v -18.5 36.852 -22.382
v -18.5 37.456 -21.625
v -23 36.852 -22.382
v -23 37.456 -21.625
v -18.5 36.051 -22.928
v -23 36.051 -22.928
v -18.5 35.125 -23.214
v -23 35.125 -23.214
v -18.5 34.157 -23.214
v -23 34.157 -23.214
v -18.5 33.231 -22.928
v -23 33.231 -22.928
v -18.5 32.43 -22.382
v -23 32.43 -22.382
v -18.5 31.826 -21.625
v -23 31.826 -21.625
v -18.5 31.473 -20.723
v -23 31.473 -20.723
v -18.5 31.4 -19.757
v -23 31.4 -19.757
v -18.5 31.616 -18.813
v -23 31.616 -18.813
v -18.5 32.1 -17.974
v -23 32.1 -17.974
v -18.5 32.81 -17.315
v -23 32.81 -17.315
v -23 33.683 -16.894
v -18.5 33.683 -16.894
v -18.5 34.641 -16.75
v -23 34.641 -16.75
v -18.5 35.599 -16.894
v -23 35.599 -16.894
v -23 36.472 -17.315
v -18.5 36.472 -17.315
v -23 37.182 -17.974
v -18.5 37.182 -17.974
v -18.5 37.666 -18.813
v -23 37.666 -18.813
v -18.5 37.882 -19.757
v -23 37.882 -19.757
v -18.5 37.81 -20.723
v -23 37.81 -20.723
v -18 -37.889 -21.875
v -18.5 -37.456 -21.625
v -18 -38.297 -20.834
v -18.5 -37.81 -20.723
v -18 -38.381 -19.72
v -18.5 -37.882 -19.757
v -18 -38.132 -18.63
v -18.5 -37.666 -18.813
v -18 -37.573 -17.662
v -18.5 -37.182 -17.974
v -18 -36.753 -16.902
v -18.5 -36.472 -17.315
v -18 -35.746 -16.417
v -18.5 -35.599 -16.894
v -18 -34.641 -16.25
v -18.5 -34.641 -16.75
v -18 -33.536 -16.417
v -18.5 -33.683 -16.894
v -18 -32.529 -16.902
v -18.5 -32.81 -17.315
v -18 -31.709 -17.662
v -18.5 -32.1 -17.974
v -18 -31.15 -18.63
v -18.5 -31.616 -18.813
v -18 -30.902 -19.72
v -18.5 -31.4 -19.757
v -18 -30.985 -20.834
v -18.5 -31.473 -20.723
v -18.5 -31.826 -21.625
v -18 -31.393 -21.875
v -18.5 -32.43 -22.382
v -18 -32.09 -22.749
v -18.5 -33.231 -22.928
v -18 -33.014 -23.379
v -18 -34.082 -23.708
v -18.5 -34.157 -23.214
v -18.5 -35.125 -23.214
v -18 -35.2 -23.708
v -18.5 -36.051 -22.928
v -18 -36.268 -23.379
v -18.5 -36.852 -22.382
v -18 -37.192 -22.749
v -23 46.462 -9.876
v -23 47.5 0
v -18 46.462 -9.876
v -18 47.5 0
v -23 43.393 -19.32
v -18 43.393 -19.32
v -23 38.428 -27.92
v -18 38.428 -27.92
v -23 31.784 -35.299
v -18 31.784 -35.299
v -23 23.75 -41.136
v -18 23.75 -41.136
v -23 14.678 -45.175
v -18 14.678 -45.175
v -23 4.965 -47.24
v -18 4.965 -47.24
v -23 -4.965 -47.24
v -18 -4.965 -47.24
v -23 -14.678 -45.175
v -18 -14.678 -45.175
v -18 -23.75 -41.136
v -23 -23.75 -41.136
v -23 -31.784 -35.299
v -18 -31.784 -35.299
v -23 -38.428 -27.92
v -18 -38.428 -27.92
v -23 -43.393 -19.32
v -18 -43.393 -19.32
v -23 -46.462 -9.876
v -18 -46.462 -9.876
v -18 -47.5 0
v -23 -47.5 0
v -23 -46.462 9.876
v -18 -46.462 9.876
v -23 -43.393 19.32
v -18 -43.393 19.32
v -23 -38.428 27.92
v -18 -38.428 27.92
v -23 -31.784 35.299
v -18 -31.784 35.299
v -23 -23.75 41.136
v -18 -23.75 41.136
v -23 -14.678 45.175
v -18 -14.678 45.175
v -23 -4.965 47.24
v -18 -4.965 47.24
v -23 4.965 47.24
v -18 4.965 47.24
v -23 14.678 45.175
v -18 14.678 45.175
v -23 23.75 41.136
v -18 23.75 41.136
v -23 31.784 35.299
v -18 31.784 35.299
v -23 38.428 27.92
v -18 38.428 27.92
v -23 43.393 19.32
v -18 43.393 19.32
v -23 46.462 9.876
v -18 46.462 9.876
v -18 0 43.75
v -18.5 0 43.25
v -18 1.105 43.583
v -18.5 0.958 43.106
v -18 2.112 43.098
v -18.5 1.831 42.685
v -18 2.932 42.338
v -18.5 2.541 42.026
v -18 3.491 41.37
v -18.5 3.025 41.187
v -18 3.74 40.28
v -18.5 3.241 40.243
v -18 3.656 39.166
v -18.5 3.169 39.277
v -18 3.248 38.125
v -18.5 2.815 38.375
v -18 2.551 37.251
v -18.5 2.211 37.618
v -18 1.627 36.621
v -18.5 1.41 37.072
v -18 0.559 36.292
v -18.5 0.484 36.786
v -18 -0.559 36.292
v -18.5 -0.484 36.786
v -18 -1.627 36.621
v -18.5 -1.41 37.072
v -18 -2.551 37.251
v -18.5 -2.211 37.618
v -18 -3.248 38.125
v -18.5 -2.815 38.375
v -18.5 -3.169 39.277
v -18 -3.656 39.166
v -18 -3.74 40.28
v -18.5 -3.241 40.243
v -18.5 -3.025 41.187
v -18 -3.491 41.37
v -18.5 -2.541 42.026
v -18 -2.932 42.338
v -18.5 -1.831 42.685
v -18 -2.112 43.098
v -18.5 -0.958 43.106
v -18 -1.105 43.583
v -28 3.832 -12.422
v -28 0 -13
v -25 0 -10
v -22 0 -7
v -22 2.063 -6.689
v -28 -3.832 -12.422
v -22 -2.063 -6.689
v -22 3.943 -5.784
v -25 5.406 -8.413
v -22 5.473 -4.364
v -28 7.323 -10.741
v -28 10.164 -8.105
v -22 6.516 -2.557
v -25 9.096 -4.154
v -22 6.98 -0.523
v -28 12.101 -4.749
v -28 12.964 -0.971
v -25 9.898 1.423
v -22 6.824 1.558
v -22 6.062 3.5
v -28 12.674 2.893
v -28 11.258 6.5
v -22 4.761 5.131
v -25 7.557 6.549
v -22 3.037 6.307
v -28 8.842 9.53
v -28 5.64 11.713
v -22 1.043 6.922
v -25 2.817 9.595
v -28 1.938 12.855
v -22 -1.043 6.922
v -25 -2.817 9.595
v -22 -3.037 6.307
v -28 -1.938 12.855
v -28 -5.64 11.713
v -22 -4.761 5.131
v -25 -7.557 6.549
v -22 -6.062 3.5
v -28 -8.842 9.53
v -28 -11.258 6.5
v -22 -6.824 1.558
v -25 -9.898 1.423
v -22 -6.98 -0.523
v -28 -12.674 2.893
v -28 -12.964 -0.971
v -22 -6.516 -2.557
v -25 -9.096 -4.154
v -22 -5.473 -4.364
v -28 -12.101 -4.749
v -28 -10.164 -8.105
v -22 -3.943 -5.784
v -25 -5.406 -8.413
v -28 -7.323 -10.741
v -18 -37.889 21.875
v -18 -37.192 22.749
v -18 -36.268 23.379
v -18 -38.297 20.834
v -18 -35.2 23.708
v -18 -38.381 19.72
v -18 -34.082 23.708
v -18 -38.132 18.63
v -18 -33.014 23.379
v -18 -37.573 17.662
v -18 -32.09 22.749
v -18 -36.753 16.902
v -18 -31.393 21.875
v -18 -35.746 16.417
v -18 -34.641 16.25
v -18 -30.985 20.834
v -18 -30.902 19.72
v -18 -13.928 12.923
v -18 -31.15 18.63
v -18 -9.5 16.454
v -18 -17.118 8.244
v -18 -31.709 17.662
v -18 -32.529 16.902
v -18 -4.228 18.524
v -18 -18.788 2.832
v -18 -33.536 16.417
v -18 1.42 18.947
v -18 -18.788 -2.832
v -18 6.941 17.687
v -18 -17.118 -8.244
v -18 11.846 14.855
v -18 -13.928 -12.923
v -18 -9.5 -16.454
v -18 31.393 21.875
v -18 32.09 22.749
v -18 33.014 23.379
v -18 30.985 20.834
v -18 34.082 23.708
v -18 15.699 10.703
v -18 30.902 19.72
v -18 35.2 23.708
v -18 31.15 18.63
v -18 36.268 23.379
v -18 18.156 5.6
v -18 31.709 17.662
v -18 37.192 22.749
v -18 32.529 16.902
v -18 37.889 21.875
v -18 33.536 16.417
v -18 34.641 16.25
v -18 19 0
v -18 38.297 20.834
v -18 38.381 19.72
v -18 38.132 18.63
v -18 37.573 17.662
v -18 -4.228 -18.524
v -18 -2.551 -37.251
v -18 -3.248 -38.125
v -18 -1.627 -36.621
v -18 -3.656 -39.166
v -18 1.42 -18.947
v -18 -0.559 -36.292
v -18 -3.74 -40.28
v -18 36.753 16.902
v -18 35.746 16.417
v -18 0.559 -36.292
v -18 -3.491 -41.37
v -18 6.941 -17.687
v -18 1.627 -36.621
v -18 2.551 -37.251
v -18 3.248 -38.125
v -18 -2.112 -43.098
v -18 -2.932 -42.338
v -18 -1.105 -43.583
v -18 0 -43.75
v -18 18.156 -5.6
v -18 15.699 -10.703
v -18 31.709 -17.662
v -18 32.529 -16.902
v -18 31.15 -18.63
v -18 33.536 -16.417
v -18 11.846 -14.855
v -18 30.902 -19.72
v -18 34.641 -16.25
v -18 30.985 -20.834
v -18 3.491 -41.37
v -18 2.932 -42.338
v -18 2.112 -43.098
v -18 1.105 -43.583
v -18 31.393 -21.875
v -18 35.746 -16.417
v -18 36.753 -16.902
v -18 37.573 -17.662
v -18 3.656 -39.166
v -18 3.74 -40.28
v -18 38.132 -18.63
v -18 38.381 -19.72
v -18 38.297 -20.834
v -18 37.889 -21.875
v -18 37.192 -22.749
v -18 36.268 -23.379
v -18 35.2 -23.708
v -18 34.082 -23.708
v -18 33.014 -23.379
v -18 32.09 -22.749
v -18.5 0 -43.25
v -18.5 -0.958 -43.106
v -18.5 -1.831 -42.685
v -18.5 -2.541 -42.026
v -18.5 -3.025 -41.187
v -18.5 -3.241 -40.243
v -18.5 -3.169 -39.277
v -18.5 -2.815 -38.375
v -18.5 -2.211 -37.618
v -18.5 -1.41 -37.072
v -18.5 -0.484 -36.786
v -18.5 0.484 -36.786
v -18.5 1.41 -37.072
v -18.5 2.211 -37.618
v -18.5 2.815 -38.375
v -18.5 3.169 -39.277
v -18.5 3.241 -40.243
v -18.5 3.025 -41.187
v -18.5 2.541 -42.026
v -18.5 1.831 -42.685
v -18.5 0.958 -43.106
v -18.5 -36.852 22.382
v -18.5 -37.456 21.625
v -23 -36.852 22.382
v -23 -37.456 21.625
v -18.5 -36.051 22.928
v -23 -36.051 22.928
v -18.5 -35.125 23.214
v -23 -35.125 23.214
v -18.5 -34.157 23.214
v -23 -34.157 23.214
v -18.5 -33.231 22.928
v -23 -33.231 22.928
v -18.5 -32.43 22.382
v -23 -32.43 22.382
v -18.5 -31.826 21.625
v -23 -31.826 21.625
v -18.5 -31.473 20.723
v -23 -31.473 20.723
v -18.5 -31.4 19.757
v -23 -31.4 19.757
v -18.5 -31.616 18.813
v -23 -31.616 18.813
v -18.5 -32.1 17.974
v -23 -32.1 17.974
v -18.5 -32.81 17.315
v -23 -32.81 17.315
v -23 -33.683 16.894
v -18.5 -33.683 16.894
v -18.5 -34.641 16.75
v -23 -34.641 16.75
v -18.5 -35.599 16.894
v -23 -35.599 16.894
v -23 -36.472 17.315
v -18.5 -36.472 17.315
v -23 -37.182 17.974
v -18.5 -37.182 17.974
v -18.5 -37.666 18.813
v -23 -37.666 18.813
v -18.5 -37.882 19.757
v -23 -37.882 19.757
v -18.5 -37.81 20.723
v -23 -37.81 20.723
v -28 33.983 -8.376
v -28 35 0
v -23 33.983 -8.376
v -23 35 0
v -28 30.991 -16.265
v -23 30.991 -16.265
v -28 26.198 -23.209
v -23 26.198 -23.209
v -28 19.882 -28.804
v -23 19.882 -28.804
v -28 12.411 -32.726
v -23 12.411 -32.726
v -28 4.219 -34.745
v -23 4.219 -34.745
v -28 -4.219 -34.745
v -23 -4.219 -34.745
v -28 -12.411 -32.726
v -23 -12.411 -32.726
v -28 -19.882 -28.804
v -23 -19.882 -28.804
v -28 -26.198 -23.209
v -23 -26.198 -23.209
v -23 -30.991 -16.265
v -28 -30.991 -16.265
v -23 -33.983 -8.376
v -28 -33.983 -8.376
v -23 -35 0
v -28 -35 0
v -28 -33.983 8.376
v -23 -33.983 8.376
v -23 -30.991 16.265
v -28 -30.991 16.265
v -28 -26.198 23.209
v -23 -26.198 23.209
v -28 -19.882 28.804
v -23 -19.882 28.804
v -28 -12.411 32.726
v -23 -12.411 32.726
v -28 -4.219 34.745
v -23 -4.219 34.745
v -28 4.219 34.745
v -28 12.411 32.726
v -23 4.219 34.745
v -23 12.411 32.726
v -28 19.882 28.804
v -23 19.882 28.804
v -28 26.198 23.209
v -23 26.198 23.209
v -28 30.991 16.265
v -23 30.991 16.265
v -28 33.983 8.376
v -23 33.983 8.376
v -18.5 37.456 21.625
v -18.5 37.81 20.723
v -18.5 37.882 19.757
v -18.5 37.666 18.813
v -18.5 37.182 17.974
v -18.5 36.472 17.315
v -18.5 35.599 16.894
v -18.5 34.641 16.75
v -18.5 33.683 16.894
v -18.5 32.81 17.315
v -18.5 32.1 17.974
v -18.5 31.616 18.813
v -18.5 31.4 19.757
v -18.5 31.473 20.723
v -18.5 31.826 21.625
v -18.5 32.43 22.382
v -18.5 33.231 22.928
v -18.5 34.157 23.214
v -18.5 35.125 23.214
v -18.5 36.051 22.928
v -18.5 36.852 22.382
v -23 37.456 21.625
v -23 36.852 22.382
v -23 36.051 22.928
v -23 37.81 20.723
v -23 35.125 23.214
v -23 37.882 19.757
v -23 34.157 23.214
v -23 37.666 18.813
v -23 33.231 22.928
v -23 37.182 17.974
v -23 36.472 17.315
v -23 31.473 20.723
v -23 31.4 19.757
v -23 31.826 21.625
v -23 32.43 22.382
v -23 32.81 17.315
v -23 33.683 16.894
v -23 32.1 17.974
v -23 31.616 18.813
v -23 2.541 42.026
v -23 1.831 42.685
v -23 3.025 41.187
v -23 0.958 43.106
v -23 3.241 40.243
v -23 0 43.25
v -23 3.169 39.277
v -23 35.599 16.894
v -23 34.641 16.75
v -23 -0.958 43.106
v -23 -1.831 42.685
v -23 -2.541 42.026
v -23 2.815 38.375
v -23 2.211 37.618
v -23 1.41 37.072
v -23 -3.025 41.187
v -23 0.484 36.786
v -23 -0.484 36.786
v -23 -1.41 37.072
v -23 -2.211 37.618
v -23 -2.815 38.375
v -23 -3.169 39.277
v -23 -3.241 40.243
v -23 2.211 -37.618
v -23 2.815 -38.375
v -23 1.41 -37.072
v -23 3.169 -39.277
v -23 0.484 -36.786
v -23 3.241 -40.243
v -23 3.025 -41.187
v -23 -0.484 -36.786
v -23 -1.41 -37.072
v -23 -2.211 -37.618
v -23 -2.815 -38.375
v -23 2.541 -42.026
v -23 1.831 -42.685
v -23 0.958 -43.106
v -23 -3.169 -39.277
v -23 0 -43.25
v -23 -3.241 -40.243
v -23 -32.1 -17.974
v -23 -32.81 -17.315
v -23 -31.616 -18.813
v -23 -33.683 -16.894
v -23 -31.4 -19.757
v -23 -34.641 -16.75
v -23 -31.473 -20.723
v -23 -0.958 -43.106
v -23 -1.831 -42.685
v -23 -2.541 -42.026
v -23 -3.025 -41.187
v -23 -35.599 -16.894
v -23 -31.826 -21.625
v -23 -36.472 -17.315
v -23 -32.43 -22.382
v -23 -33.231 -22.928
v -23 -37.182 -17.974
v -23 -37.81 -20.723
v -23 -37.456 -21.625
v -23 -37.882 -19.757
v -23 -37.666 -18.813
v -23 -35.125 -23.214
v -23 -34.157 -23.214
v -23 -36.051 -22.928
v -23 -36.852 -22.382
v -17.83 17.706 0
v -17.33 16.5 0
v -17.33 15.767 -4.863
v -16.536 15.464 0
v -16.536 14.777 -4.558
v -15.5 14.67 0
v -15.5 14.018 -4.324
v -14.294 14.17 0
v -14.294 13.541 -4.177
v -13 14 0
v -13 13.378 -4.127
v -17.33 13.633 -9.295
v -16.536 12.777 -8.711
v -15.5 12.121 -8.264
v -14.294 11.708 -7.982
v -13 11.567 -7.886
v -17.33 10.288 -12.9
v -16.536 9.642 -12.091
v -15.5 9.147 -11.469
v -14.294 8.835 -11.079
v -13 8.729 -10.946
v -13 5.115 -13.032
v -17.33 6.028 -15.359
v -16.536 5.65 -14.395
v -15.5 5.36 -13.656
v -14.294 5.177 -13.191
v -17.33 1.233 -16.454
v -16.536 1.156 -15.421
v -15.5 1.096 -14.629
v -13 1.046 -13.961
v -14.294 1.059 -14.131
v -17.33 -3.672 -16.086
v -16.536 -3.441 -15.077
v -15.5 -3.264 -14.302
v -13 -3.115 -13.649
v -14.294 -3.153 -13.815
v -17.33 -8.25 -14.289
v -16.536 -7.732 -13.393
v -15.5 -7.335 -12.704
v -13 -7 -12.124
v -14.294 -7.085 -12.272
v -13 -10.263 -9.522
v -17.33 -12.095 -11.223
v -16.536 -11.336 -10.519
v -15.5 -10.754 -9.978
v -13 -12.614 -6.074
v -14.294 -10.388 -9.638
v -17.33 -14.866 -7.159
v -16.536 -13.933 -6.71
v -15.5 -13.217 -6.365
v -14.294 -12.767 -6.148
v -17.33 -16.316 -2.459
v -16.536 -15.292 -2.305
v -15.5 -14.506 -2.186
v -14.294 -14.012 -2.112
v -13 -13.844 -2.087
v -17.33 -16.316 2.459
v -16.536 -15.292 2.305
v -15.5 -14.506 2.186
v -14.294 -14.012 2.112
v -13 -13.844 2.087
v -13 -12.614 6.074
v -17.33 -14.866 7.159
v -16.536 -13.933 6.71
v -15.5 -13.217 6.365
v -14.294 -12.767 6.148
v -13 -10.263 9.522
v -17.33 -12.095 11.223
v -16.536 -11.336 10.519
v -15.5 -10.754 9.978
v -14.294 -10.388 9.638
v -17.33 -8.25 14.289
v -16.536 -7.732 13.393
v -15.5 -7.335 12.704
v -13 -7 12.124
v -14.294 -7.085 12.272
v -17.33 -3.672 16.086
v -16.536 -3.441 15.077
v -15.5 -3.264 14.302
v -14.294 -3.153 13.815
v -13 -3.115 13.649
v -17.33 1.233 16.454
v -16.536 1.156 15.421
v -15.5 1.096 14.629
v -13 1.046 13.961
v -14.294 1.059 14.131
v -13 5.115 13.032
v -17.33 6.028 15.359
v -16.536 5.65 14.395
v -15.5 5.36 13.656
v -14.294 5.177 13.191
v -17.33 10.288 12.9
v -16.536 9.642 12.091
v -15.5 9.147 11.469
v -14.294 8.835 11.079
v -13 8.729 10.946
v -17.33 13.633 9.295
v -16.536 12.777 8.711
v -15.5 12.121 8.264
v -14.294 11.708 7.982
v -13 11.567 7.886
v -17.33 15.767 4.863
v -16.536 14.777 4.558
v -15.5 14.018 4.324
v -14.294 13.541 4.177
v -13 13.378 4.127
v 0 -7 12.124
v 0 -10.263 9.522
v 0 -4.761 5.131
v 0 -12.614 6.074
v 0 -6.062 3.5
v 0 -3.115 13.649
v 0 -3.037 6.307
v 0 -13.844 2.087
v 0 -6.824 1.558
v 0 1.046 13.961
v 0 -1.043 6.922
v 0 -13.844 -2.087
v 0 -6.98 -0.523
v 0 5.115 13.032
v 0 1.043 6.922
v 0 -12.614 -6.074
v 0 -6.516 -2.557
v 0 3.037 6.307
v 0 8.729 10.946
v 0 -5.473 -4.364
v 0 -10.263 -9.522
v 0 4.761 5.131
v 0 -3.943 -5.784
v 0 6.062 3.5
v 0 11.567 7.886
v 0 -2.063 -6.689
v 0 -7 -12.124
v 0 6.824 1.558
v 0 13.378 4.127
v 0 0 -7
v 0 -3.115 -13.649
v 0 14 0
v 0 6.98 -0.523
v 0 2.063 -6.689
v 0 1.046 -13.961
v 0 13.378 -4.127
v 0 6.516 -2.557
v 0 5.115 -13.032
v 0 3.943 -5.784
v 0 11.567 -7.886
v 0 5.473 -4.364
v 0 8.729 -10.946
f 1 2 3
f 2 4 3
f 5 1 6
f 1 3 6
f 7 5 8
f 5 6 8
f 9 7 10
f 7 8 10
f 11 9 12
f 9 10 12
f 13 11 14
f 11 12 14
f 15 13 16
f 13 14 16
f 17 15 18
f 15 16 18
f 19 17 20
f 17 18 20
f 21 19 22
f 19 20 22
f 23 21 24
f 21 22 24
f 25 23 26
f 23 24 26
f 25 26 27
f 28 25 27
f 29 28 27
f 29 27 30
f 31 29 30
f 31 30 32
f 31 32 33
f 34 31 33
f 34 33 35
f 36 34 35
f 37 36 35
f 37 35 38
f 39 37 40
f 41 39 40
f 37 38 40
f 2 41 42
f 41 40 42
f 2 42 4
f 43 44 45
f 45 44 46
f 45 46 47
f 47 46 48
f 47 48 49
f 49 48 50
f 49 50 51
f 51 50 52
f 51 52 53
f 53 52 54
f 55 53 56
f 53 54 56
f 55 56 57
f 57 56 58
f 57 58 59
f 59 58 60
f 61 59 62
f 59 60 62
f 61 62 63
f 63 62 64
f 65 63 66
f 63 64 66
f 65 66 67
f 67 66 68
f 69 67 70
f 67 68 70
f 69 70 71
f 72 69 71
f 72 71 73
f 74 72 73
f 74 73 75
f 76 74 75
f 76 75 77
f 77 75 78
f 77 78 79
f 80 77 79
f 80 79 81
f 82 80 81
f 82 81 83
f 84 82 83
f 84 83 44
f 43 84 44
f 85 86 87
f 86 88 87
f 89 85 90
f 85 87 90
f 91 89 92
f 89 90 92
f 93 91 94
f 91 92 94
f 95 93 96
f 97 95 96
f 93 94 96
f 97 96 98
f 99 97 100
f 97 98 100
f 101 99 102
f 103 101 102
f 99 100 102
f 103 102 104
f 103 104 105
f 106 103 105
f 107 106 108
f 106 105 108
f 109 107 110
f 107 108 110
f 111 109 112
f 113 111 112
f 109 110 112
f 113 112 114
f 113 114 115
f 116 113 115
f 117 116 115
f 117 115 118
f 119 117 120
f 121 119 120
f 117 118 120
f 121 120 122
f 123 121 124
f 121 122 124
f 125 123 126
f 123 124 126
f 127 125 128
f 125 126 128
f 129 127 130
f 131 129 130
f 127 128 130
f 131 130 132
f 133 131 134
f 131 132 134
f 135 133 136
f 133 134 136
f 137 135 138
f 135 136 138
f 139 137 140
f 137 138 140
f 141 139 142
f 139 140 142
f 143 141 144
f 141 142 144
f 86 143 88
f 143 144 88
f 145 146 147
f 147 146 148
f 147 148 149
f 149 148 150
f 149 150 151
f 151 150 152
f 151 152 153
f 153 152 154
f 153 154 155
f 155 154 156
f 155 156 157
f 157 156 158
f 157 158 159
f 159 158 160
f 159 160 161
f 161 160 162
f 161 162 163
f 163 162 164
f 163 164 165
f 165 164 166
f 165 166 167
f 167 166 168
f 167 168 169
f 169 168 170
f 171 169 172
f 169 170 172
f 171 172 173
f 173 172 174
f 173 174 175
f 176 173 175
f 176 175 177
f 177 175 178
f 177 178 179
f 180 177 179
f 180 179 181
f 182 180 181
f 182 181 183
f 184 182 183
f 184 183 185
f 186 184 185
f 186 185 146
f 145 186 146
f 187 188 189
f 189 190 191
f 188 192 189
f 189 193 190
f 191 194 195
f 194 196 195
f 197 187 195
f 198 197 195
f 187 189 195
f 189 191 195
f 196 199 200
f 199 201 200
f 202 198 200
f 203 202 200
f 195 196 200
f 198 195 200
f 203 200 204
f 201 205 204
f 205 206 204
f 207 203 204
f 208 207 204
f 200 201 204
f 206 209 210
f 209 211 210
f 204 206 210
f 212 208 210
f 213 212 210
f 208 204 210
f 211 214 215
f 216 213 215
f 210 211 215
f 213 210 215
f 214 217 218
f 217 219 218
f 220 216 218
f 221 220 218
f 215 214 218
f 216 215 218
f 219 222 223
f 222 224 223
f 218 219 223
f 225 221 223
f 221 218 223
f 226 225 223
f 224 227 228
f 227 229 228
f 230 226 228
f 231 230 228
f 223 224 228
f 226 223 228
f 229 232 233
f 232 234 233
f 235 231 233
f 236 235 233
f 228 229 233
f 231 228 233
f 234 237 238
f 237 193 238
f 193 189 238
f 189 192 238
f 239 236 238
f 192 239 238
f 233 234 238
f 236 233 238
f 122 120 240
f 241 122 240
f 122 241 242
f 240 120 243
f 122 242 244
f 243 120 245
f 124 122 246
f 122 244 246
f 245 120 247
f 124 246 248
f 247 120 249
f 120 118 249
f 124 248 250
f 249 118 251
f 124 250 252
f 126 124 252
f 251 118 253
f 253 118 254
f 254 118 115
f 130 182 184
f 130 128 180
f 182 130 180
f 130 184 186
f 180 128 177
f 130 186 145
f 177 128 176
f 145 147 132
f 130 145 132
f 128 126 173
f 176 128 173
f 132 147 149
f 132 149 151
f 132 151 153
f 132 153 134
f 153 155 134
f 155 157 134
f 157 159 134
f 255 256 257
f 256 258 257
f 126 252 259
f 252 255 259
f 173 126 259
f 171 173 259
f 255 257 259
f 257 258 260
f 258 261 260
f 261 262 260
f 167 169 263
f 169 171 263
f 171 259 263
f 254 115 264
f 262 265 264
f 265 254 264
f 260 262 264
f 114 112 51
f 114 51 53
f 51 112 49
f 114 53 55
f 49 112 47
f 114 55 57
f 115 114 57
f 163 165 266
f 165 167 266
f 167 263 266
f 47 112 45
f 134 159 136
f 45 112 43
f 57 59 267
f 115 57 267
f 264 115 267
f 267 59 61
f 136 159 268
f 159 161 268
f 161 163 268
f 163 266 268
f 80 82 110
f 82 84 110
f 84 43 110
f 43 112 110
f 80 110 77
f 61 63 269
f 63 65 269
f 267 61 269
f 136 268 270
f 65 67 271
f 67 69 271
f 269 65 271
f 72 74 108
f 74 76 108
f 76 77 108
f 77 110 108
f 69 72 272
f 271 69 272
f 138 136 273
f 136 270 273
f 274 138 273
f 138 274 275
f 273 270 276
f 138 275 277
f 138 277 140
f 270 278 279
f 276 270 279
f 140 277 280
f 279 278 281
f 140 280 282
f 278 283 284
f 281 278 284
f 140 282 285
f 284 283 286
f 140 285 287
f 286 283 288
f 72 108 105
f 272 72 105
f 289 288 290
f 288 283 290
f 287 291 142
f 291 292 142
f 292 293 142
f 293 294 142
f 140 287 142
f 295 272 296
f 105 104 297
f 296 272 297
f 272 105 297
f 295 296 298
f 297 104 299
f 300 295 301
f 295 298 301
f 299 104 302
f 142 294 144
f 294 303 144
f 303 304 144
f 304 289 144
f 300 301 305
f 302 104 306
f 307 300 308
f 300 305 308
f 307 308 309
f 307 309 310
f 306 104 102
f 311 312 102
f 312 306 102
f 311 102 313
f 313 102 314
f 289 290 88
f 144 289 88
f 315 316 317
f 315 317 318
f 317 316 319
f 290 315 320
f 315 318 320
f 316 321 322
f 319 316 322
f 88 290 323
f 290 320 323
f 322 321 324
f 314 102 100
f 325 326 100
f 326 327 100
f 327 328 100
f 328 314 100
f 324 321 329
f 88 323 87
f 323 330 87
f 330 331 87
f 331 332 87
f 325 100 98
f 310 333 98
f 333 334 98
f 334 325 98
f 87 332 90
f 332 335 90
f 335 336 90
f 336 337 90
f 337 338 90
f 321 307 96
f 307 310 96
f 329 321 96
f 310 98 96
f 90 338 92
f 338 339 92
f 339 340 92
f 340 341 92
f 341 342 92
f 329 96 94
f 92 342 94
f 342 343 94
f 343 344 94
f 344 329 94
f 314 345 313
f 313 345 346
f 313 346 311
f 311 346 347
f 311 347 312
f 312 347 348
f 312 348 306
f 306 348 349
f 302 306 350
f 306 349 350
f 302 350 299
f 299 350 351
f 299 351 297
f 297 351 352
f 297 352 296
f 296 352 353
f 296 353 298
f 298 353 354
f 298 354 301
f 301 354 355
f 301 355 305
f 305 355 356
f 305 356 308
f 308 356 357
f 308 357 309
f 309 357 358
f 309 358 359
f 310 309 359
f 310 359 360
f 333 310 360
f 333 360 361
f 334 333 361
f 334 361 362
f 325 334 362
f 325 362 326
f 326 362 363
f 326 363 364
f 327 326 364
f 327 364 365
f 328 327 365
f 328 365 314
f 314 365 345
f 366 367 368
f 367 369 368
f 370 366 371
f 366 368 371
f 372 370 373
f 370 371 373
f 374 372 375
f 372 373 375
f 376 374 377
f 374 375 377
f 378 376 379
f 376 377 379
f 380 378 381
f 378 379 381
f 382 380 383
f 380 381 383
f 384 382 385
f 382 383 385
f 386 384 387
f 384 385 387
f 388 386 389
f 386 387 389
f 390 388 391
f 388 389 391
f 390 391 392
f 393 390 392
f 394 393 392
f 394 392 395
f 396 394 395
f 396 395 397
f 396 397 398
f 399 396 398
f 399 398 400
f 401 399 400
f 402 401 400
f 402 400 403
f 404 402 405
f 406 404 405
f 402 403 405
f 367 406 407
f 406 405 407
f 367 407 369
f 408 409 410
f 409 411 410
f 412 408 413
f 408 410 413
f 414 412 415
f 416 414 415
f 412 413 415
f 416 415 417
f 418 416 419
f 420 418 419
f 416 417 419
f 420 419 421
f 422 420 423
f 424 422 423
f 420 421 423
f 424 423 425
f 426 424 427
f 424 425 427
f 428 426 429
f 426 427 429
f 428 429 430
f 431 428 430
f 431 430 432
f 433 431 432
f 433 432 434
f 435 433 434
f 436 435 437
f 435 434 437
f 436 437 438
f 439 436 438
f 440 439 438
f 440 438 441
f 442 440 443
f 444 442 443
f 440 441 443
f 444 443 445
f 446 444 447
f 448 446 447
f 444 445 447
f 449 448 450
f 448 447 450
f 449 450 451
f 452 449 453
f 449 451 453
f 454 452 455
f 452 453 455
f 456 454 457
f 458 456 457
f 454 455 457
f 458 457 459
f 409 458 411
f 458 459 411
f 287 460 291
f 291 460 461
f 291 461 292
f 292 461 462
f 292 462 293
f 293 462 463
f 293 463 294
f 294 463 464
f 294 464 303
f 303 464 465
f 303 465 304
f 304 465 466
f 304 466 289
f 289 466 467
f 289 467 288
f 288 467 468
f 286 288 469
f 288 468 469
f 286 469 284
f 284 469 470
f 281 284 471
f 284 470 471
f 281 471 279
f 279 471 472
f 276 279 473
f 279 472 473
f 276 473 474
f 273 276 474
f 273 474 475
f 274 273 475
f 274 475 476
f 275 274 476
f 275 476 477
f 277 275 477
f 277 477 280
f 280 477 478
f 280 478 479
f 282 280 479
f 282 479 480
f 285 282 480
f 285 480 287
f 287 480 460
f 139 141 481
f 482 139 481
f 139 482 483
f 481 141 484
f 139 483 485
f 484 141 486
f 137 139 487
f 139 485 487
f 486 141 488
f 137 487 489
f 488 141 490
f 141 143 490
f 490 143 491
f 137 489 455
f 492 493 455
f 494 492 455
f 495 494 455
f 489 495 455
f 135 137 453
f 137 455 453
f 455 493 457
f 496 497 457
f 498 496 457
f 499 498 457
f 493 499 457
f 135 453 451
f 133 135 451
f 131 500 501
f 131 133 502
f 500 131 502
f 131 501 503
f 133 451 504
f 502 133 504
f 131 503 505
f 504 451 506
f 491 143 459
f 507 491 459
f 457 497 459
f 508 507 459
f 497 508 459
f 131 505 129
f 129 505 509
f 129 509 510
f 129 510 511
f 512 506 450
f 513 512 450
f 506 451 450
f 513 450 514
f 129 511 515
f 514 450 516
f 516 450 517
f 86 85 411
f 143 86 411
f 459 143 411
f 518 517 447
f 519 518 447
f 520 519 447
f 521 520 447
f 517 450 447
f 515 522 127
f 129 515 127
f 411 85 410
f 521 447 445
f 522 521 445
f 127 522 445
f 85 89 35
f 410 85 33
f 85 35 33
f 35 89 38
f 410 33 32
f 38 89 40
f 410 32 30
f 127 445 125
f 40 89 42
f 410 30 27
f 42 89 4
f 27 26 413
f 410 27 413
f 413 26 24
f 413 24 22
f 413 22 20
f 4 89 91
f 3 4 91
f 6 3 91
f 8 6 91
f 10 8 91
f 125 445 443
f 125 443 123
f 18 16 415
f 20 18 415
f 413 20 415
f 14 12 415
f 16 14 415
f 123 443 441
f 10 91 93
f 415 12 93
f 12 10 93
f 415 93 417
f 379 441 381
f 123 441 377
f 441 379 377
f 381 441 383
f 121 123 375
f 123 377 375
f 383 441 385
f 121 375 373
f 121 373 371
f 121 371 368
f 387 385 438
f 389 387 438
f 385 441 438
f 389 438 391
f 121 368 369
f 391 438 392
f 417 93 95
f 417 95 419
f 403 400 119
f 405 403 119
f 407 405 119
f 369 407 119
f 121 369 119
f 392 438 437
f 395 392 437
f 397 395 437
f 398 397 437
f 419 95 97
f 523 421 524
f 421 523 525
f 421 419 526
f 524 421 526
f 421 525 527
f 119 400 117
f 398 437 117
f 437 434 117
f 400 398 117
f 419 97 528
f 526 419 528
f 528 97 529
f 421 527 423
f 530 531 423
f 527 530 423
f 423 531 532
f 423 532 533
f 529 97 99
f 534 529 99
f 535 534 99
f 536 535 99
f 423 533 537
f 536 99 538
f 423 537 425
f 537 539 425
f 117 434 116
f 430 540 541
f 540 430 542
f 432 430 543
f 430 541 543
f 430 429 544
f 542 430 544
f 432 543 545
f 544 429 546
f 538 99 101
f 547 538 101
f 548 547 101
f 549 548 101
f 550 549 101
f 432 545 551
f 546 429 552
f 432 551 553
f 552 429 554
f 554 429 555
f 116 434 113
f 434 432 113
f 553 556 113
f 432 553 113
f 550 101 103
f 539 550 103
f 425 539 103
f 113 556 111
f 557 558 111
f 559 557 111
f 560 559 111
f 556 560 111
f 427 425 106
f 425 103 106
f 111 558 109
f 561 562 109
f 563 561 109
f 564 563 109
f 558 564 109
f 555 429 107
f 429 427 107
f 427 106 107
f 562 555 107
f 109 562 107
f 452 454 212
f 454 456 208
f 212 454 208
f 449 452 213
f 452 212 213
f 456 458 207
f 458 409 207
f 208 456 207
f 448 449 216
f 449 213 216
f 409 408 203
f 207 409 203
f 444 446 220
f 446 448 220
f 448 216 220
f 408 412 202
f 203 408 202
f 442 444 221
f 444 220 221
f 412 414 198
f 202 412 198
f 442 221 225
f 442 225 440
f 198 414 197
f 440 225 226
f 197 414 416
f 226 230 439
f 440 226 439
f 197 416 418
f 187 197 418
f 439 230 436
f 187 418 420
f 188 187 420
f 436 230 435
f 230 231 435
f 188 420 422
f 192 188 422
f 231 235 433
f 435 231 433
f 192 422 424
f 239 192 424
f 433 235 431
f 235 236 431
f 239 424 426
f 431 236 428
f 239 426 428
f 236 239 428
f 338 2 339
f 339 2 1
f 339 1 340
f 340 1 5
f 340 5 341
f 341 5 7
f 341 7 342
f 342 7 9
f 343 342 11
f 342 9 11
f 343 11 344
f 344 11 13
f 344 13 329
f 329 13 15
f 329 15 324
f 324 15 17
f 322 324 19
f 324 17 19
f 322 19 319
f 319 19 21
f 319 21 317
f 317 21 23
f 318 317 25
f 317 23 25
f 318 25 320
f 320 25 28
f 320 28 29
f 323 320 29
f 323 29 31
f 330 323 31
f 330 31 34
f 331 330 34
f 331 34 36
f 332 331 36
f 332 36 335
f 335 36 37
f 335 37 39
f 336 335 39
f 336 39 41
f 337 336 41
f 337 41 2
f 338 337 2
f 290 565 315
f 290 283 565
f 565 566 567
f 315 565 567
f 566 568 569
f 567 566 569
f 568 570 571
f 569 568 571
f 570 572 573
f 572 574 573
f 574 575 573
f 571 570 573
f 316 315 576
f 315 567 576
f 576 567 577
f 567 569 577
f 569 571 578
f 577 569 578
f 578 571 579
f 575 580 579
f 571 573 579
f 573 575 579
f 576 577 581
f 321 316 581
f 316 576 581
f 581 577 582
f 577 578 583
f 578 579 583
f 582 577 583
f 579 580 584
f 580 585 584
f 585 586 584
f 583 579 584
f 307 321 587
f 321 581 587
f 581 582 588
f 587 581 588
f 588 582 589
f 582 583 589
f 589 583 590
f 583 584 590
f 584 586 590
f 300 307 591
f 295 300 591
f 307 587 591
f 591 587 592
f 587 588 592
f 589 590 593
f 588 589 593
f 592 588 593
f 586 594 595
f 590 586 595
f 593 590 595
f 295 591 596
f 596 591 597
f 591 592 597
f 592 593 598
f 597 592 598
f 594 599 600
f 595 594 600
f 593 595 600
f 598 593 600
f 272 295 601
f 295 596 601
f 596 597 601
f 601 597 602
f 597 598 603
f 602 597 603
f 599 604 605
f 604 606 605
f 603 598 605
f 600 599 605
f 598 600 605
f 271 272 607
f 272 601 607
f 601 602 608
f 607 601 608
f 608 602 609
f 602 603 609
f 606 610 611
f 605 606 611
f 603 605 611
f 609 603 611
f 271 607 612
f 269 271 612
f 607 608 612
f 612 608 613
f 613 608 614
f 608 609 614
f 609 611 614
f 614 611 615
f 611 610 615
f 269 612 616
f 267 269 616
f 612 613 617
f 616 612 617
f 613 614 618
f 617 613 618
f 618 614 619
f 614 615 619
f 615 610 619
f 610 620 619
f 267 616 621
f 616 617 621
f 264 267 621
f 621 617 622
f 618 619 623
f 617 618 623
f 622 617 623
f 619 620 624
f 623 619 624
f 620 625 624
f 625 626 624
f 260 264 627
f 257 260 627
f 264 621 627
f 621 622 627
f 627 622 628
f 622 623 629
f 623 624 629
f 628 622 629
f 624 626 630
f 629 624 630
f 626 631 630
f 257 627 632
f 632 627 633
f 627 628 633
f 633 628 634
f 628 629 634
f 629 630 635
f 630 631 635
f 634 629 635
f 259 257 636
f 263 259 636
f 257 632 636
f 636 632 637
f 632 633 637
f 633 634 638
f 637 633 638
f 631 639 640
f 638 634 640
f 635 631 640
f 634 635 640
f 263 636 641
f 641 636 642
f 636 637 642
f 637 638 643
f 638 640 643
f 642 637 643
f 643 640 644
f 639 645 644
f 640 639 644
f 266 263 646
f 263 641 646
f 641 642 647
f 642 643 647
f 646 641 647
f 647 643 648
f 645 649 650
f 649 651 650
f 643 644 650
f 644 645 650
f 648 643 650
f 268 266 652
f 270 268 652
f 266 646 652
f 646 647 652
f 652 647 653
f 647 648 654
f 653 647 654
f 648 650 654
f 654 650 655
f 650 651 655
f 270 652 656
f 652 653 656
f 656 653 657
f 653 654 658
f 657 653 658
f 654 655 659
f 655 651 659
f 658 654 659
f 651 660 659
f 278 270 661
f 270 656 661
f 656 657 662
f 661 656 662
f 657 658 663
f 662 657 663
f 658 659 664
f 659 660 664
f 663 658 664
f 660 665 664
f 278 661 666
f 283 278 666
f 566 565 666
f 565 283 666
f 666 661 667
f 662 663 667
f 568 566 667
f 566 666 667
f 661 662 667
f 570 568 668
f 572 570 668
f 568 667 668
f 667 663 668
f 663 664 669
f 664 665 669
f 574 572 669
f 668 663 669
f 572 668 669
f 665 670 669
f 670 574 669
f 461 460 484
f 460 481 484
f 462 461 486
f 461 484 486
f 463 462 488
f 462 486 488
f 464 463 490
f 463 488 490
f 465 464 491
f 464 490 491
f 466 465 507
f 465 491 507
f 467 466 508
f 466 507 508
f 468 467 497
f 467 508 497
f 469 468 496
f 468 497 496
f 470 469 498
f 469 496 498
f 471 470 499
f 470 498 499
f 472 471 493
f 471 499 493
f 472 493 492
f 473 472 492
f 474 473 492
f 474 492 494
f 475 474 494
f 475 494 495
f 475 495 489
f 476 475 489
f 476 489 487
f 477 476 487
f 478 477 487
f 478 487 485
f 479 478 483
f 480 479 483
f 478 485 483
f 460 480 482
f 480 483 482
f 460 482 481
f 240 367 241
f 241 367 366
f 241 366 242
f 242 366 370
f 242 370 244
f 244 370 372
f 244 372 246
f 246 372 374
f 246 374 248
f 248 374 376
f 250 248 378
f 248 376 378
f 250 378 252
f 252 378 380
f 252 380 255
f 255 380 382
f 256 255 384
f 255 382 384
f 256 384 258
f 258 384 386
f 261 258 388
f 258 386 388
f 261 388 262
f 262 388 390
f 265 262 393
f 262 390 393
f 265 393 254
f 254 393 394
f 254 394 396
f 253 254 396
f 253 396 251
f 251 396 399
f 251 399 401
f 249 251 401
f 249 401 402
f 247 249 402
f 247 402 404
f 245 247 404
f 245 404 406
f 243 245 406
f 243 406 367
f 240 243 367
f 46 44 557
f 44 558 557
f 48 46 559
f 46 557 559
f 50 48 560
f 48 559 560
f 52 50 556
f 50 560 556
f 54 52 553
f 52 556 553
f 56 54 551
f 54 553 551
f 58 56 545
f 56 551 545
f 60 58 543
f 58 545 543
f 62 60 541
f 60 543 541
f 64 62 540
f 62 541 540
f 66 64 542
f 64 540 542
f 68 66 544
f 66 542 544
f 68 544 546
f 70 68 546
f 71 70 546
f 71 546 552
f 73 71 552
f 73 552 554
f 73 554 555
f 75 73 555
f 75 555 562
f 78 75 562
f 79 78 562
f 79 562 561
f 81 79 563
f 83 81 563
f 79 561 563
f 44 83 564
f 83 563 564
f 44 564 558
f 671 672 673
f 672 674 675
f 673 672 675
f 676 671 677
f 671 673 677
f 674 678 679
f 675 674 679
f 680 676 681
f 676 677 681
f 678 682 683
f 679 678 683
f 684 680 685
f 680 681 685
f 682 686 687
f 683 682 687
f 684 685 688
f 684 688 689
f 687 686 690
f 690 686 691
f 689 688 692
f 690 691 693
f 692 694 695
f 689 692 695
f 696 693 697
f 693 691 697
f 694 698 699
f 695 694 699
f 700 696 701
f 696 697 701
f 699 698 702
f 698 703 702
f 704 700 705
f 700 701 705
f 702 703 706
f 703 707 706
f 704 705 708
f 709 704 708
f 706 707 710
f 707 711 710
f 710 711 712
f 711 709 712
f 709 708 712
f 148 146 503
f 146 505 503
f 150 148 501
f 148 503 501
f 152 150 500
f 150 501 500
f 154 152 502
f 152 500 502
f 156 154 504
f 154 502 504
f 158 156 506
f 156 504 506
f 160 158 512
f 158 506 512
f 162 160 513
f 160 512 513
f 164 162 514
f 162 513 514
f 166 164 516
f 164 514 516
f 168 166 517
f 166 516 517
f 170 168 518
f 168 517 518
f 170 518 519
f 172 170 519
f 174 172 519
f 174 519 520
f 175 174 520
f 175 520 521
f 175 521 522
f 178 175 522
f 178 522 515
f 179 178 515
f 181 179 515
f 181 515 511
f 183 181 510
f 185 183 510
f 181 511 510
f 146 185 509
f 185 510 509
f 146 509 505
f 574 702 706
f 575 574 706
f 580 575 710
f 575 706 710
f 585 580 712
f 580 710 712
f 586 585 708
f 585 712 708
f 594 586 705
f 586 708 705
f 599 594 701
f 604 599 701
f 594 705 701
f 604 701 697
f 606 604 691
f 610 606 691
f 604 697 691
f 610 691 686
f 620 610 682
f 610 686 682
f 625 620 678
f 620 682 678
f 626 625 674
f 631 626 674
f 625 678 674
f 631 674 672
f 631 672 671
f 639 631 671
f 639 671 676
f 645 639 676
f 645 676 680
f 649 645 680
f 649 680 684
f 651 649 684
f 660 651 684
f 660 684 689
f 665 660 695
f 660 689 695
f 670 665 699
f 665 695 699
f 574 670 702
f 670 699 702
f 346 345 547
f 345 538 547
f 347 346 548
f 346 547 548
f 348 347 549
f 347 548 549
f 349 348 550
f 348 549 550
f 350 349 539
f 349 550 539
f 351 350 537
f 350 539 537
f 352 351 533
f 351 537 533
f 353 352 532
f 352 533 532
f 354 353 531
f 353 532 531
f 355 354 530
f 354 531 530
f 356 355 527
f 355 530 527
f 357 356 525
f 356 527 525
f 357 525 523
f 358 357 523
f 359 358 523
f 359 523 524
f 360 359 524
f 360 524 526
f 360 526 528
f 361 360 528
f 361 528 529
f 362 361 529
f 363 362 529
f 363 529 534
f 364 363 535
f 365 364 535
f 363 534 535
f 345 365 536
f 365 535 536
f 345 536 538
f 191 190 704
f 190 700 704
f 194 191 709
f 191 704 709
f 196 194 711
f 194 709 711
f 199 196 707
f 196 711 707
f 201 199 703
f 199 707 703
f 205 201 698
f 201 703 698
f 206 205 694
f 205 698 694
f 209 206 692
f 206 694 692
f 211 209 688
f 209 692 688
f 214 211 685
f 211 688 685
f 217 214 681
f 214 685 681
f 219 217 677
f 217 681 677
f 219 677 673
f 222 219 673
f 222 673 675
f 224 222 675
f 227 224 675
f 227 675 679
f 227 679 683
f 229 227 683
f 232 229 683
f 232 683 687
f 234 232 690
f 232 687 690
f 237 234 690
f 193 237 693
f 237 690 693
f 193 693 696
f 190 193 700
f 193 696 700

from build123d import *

# Parameters (mm, degrees)
FILLET1_R                                            = 5
CSK_FOR_M12_HEX_SOCKET_COUNTERSUNK_CAP_S_D           = 14
CSK_FOR_M12_HEX_SOCKET_COUNTERSUNK_CAP_S_CSINK_D     = 26
CSK_FOR_M12_HEX_SOCKET_COUNTERSUNK_CAP_S_CSINK_ANGLE = 90
CSK_FOR_M6_HEX_SOCKET_COUNTERSUNK_CAP_SC_D           = 6.5
CSK_FOR_M6_HEX_SOCKET_COUNTERSUNK_CAP_SC_CSINK_D     = 7.5
CSK_FOR_M6_HEX_SOCKET_COUNTERSUNK_CAP_SC_CSINK_ANGLE = 90
CIRPATTERN1_COUNT                                    = 6


with BuildPart() as part:
    # Sketch1 → Revolve1 (revolve)
    with BuildSketch(Plane.XY):
        Polygon((0, 0), (-28, 0), (-28, 35), (-23, 35), (-23, 47.5), (-18, 47.5), (-18, 14), (0, 14), align=None)
    revolve(axis=Axis((0, 0, 0), (-1, 0, 0)))

    # Fillet1
    fillet1_edges = [part.edges().sort_by_distance(p)[0] for p in [
        (-18, -14, 0),
    ]]
    fillet(fillet1_edges, radius=FILLET1_R)

    # CSK for M12 Hex Socket Countersunk Cap Screw1 (through all)
    with Locations(Plane.ZY.offset(28)):
        with Locations((0, 0)):
            CounterSinkHole(CSK_FOR_M12_HEX_SOCKET_COUNTERSUNK_CAP_S_D / 2, CSK_FOR_M12_HEX_SOCKET_COUNTERSUNK_CAP_S_CSINK_D / 2, counter_sink_angle=CSK_FOR_M12_HEX_SOCKET_COUNTERSUNK_CAP_S_CSINK_ANGLE)

    # CSK for M6 Hex Socket Countersunk Cap Screw1 (through all)
    with Locations(Plane(origin=(-18, 0, 0), x_dir=(0, 0, -1), z_dir=(1, 0, 0))):
        with Locations((-40, 0)):
            csk_for_m6_hex_socket_countersunk_cap_sc = CounterSinkHole(CSK_FOR_M6_HEX_SOCKET_COUNTERSUNK_CAP_SC_D / 2, CSK_FOR_M6_HEX_SOCKET_COUNTERSUNK_CAP_SC_CSINK_D / 2, counter_sink_angle=CSK_FOR_M6_HEX_SOCKET_COUNTERSUNK_CAP_SC_CSINK_ANGLE)

    # CirPattern1: CSK for M6 Hex Socket Countersunk Cap Screw1 ×6 about axis
    cirpattern1_axis = Axis((0, 0, 0), (1, 0, 0))
    for i in range(1, CIRPATTERN1_COUNT):
        add(csk_for_m6_hex_socket_countersunk_cap_sc.rotate(cirpattern1_axis, i * 360 / CIRPATTERN1_COUNT), mode=Mode.SUBTRACT)


solid = part.part
